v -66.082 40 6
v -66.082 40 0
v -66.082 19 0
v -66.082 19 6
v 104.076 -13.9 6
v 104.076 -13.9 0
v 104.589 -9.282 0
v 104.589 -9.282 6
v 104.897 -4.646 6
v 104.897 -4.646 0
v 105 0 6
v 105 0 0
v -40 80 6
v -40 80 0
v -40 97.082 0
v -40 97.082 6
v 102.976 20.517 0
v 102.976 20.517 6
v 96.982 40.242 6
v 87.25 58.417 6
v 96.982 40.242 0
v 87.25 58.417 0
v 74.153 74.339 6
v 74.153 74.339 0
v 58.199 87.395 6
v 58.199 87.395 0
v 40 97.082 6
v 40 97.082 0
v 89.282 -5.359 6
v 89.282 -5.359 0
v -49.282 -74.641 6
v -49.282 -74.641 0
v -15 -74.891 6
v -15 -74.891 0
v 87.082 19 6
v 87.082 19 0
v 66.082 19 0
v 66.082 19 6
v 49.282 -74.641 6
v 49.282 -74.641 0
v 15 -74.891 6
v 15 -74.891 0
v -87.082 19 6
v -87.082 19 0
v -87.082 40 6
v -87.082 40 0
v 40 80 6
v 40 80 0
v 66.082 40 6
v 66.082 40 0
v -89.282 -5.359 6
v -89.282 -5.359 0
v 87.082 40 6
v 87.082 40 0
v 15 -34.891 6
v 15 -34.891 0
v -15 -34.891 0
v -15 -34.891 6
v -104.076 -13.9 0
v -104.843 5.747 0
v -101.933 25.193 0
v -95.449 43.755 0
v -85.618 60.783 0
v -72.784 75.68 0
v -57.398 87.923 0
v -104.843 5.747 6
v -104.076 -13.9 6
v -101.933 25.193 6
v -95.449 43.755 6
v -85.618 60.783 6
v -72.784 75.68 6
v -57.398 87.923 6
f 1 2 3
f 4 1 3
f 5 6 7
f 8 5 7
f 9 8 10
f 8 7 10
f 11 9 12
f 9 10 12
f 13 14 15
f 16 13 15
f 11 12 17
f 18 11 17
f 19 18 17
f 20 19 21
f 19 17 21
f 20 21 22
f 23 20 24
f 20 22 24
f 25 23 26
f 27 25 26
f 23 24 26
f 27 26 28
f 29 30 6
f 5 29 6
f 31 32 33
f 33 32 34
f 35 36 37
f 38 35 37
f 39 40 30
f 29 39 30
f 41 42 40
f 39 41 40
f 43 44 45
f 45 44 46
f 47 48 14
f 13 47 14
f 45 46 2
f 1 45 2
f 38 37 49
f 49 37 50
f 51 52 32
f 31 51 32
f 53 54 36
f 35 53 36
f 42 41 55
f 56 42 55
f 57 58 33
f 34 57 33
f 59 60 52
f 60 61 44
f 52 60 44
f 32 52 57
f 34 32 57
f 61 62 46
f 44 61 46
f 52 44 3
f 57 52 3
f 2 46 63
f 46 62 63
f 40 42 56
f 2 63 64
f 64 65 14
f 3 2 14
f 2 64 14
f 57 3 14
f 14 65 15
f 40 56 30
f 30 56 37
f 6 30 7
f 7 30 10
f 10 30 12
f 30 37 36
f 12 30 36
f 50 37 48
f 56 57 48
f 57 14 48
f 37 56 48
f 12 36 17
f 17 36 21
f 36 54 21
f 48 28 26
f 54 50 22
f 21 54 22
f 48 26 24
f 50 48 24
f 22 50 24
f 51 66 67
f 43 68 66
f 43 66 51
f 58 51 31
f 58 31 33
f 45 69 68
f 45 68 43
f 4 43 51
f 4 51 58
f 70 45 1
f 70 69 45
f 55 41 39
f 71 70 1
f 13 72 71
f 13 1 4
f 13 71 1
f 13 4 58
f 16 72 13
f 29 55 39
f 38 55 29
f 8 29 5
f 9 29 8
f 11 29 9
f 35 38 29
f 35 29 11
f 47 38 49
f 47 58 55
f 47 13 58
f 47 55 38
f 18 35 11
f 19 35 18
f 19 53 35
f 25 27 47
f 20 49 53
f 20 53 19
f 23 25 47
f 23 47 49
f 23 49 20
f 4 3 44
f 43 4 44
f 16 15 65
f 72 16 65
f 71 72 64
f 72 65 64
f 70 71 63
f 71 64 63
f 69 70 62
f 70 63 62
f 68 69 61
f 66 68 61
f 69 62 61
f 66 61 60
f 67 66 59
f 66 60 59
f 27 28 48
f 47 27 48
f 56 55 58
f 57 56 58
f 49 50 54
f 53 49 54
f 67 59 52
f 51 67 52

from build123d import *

# Parameters (mm, degrees)
F1_DEPTH = 6
F3_DEPTH = 25


# Not quite as in the source:
# - a feature names something its author has since deleted; it is built from what else it names


with BuildPart() as f1:
    # F0 (on Top) → F1 (new body)
    with BuildSketch(Plane.XY):
        with BuildLine():
            ThreePointArc((104.075858604, -13.900203446), (104.7687099124, -6.9654449456), (105, 0))
            ThreePointArc((105, 0), (87.2496418331, 58.4166072277), (40, 97.0824391947))
            Line((40, 97.0824391947), (40, 80))
            Line((40, 80), (0, 80))
            Line((0, 80), (-40, 80))
            Line((-40, 80), (-40, 97.0824391947))
            ThreePointArc((-40, 97.0824391947), (-90.9326673974, 52.5), (-104.075858604, -13.900203446))
            Line((-104.075858604, -13.900203446), (-89.2820323028, -5.3589838486))
            Line((-89.2820323028, -5.3589838486), (-95.2820323028, 5.0333209968))
            Line((-95.2820323028, 5.0333209968), (-71.0910346562, 19))
            Line((-71.0910346562, 19), (-87.0824391947, 19))
            Line((-87.0824391947, 19), (-87.0824391947, 40))
            Line((-87.0824391947, 40), (-66.0824391947, 40))
            Line((-66.0824391947, 40), (-66.0824391947, 21.8917139379))
            Line((-66.0824391947, 21.8917139379), (-56.3108891325, 27.5333209968))
            Line((-56.3108891325, 27.5333209968), (-30.3108891325, -17.5))
            Line((-30.3108891325, -17.5), (-30.3108891325, 35))
            Line((-30.3108891325, 35), (30.3108891325, 35))
            Line((30.3108891325, 35), (30.3108891325, -17.5))
            Line((30.3108891325, -17.5), (56.3108891325, 27.5333209968))
            Line((56.3108891325, 27.5333209968), (66.0824391947, 21.8917139379))
            Line((66.0824391947, 21.8917139379), (66.0824391947, 40))
            Line((66.0824391947, 40), (87.0824391947, 40))
            Line((87.0824391947, 40), (87.0824391947, 19))
            Line((87.0824391947, 19), (71.0910346562, 19))
            Line((71.0910346562, 19), (95.2820323028, 5.0333209968))
            Line((95.2820323028, 5.0333209968), (89.2820323028, -5.3589838486))
            Line((89.2820323028, -5.3589838486), (104.075858604, -13.900203446))
        make_face()
        Polygon((-95.2820323028, 5.0333209968), (-89.2820323028, -5.3589838486), (-69.2820323028, -40), (-30.3108891325, -17.5), (-56.3108891325, 27.5333209968), (-66.0824391947, 21.8917139379), (-66.0824391947, 19), (-71.0910346562, 19), align=None)
        Polygon((0, -17.5), (30.3108891325, -17.5), (30.3108891325, 35), (-30.3108891325, 35), (-30.3108891325, -17.5), align=None)
        Polygon((69.2820323028, -40), (89.2820323028, -5.3589838486), (95.2820323028, 5.0333209968), (71.0910346562, 19), (66.0824391947, 19), (66.0824391947, 21.8917139379), (56.3108891325, 27.5333209968), (30.3108891325, -17.5), align=None)
        Polygon((-49.2820323028, -74.6410161514), (0, -75), (0, -17.5), (-30.3108891325, -17.5), (-69.2820323028, -40), align=None)
        Polygon((0, -75), (49.2820323028, -74.6410161514), (69.2820323028, -40), (30.3108891325, -17.5), (0, -17.5), align=None)
    extrude(amount=F1_DEPTH)

    # F2 (on face) → F3 (cut)
    with BuildSketch(Plane.XY.offset(6)):
        Polygon((-14.9996020609, -74.890738782), (0, -75), (14.9996020609, -74.890738782), (15.0003979391, -34.890738782), (-14.9996020609, -34.890738782), align=None)
    extrude(amount=-F3_DEPTH, mode=Mode.SUBTRACT)


solid = f1.part
